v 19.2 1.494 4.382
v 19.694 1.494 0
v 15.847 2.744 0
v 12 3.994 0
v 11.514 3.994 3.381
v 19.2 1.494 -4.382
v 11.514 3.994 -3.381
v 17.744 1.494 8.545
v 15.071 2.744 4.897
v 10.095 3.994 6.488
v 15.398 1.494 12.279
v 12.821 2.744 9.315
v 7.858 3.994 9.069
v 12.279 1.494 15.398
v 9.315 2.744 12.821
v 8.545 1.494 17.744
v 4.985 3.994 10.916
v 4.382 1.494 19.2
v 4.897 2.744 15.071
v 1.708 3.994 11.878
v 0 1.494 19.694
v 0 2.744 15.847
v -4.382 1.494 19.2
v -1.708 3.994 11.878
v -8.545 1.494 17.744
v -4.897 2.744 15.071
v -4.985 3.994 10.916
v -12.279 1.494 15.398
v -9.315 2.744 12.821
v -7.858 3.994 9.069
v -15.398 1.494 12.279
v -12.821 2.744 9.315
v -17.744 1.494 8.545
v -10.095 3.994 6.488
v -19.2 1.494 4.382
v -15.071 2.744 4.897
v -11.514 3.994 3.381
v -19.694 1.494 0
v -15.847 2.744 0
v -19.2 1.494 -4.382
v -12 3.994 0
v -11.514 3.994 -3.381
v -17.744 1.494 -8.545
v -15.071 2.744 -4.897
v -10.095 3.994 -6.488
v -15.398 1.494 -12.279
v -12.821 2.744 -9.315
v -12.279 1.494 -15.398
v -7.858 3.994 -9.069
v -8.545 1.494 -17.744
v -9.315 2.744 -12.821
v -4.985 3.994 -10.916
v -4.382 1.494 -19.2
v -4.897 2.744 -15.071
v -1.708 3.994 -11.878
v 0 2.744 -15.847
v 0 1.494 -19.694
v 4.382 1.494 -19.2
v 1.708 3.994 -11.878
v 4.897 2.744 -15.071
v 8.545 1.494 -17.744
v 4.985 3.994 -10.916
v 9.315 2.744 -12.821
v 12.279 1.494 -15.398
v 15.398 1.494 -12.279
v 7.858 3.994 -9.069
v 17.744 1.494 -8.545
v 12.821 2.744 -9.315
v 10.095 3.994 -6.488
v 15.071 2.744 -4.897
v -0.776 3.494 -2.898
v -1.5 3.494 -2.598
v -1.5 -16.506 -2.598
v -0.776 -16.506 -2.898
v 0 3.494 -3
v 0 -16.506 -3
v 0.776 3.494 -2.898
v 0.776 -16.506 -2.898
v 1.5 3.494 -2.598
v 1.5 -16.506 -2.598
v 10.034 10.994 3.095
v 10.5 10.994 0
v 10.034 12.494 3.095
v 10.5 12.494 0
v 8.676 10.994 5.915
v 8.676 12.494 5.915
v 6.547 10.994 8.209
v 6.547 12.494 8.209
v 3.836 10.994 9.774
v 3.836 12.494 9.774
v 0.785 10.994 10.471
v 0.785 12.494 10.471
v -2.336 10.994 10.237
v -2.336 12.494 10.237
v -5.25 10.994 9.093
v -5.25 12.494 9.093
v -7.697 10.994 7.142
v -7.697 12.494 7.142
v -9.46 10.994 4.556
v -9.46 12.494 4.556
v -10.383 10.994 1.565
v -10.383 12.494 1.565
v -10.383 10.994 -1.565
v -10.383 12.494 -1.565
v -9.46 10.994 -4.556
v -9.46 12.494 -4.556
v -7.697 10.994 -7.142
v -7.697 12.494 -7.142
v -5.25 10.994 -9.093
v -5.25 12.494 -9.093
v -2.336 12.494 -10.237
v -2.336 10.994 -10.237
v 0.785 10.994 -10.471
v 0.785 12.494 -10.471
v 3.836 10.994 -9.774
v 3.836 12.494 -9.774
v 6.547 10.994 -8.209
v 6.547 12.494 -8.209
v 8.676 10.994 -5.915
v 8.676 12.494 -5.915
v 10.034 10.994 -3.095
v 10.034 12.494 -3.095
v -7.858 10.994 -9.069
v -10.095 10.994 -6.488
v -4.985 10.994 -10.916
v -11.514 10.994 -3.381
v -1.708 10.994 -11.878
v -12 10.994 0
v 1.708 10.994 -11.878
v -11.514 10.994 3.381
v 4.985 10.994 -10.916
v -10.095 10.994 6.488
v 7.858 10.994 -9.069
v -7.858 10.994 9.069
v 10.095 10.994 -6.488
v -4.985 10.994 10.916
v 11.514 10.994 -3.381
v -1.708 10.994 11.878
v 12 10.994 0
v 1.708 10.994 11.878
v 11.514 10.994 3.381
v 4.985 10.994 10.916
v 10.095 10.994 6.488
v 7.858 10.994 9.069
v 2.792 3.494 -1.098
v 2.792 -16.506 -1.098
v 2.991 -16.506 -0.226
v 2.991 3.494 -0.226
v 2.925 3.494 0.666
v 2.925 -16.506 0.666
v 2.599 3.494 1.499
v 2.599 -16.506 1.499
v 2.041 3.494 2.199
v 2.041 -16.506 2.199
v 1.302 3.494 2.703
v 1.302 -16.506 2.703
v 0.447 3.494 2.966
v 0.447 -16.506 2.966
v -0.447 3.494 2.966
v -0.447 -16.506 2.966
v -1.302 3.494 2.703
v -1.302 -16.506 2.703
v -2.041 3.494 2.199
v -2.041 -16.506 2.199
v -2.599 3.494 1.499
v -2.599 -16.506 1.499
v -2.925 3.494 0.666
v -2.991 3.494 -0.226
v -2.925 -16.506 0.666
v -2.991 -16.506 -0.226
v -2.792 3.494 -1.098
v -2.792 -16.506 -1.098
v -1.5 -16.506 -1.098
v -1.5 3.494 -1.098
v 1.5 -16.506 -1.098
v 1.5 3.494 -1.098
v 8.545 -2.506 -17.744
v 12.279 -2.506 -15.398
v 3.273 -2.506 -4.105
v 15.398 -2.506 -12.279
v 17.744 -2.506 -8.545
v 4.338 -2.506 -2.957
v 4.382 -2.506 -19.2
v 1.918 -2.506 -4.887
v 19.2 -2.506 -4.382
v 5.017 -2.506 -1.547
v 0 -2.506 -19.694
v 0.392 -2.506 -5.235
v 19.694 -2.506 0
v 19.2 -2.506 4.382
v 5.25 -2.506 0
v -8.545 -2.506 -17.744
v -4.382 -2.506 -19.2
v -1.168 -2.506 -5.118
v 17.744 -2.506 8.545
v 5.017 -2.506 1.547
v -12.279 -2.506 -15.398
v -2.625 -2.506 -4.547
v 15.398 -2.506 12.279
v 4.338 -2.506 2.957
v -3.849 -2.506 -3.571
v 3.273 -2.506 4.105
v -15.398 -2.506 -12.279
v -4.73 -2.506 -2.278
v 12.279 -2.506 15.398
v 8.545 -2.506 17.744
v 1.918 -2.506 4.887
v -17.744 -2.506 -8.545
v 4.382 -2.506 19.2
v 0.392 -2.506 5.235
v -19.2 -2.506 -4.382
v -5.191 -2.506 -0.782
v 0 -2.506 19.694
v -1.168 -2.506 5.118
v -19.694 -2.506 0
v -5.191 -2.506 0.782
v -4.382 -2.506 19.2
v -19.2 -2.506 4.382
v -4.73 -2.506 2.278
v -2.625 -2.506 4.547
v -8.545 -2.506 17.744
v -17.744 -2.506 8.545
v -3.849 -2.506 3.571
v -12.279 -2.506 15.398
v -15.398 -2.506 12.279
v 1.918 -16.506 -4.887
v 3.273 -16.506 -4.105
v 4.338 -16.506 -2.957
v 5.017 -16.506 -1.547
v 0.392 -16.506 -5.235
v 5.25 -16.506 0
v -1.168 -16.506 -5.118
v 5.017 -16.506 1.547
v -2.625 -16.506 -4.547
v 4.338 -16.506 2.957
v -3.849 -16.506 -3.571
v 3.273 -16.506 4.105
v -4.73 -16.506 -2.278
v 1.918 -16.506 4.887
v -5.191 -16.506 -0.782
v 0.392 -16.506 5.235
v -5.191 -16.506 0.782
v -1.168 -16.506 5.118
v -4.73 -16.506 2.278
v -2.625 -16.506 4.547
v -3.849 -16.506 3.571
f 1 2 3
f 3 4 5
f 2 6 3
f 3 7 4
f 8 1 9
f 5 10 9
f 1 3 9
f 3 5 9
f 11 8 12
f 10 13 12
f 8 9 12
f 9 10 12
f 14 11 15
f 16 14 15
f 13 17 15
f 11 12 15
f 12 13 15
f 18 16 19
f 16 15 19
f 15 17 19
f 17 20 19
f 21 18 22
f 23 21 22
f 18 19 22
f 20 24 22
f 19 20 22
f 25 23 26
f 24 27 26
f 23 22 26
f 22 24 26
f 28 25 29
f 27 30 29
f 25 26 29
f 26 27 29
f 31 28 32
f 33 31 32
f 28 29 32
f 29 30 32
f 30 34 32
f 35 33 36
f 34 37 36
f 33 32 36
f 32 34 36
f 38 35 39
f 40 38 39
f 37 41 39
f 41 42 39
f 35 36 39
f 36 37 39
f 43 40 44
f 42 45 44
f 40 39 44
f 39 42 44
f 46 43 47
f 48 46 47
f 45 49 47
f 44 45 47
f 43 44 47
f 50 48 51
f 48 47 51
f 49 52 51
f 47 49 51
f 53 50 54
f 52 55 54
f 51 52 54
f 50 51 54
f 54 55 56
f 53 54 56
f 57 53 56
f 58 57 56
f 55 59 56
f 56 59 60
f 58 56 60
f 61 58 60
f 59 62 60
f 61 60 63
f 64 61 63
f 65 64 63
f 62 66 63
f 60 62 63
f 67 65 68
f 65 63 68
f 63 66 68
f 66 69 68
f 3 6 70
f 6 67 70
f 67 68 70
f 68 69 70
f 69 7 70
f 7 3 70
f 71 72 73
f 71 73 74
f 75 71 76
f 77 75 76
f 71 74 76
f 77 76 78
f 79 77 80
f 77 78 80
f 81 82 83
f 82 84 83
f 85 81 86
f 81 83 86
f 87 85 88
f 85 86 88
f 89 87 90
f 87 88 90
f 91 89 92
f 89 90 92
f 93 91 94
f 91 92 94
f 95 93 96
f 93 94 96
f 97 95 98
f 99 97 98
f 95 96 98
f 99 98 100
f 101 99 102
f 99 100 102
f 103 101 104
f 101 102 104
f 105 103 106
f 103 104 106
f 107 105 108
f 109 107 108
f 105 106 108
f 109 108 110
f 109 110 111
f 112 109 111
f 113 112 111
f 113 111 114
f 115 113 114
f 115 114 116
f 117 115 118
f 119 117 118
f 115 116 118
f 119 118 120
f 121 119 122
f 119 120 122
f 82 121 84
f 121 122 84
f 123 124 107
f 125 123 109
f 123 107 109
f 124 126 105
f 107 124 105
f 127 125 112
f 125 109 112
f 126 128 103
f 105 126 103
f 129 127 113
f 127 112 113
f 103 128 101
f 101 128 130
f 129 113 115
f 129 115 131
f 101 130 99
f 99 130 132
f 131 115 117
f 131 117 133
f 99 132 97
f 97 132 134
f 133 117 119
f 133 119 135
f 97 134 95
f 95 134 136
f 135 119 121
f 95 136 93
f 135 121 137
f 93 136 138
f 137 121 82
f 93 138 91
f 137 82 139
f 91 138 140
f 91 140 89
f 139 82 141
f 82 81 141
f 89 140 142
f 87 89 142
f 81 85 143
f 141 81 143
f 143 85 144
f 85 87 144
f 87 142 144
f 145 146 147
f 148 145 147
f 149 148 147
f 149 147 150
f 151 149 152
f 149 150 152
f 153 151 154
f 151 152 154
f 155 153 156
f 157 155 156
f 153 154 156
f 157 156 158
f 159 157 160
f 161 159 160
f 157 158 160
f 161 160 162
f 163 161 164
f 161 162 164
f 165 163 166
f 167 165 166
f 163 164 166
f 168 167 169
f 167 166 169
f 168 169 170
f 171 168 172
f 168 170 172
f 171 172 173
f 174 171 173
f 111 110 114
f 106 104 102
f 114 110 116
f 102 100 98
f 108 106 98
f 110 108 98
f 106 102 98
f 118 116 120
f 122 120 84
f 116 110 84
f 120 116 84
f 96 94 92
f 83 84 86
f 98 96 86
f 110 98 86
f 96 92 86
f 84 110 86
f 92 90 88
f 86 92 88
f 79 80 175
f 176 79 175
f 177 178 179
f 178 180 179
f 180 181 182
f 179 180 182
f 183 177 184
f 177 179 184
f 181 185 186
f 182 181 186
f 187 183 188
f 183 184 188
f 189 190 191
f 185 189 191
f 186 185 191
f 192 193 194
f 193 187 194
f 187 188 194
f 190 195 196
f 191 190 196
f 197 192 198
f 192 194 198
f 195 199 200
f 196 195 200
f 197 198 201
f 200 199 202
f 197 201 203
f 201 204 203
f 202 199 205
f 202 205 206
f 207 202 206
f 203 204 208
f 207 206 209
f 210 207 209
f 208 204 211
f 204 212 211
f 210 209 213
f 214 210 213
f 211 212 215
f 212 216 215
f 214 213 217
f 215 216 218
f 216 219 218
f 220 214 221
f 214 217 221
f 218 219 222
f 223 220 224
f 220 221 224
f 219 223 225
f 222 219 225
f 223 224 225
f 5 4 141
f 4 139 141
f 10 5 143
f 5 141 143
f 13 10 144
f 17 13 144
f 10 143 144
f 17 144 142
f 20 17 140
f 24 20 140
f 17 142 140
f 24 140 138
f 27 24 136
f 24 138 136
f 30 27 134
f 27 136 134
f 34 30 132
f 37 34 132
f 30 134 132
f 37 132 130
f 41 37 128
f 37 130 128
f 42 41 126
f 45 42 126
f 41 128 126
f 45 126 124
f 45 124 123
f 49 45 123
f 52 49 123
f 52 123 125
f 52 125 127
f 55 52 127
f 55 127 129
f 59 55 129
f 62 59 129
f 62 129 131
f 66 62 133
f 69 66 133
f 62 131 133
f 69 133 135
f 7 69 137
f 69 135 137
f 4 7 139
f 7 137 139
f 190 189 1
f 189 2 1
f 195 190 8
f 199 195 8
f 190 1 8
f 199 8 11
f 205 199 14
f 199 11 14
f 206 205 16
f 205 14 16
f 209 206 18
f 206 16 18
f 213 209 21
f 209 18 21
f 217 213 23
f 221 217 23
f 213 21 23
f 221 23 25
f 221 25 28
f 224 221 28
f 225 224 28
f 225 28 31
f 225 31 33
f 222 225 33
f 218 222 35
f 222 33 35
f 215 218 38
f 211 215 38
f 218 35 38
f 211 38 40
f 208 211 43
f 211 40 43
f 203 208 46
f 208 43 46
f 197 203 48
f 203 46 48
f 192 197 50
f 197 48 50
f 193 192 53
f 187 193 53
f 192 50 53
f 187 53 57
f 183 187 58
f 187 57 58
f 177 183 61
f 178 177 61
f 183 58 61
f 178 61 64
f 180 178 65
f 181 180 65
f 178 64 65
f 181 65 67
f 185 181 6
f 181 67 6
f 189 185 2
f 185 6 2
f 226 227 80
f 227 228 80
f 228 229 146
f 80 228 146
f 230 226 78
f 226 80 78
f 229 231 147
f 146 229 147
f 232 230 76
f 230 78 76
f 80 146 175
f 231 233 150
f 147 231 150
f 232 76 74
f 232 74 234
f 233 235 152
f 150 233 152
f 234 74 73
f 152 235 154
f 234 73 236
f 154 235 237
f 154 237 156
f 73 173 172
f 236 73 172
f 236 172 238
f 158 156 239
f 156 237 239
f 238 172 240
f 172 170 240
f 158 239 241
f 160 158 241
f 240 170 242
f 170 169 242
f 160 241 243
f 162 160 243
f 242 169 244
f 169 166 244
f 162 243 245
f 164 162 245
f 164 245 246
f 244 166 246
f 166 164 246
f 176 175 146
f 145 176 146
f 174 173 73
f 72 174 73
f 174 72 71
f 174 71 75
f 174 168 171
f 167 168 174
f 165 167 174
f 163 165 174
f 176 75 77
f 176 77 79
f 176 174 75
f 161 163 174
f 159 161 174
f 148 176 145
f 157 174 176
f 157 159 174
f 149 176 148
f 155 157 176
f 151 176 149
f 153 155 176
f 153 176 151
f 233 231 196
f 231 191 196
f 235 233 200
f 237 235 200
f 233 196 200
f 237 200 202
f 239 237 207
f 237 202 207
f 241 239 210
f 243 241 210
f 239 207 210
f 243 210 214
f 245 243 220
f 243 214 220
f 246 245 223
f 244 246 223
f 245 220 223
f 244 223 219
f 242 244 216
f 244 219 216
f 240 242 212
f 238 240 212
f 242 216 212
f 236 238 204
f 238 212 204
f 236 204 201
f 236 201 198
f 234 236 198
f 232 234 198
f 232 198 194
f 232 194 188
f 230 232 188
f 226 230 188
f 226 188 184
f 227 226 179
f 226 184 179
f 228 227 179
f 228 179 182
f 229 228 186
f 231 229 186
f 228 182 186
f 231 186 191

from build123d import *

# Parameters (mm, degrees)
F3_DEPTH = 20


with BuildPart() as f1:
    # F0 (on Top) → F1 (revolve)
    with BuildSketch(Plane.XY):
        Polygon((5.25, -16.505901), (5.25, -2.505901), (19.694209, -2.505901), (19.694209, 1.494099), (12, 3.994099), (12, 10.994099), (10.5, 10.994099), (10.5, 12.494099), (0, 12.494099), (0, -16.505901), align=None)
    revolve(axis=Axis((0, -14.739398, 0), (0, -1, 0)))

    # F2 (on face) → F3 (cut)
    with BuildSketch(Plane.XZ.offset(16.505901)):
        with BuildLine():
            Line((-1.5, -1.098076), (-1.5, -2.598076))
            ThreePointArc((-1.5, -2.598076), (0, -3), (1.5, -2.598076))
            Line((1.5, -2.598076), (1.5, -1.098076))
            Line((1.5, -1.098076), (2.791815, -1.098076))
            ThreePointArc((2.791815, -1.098076), (0, 3), (-2.791815, -1.098076))
            Line((-2.791815, -1.098076), (-1.5, -1.098076))
        make_face()
    extrude(amount=-F3_DEPTH, mode=Mode.SUBTRACT)


solid = f1.part
